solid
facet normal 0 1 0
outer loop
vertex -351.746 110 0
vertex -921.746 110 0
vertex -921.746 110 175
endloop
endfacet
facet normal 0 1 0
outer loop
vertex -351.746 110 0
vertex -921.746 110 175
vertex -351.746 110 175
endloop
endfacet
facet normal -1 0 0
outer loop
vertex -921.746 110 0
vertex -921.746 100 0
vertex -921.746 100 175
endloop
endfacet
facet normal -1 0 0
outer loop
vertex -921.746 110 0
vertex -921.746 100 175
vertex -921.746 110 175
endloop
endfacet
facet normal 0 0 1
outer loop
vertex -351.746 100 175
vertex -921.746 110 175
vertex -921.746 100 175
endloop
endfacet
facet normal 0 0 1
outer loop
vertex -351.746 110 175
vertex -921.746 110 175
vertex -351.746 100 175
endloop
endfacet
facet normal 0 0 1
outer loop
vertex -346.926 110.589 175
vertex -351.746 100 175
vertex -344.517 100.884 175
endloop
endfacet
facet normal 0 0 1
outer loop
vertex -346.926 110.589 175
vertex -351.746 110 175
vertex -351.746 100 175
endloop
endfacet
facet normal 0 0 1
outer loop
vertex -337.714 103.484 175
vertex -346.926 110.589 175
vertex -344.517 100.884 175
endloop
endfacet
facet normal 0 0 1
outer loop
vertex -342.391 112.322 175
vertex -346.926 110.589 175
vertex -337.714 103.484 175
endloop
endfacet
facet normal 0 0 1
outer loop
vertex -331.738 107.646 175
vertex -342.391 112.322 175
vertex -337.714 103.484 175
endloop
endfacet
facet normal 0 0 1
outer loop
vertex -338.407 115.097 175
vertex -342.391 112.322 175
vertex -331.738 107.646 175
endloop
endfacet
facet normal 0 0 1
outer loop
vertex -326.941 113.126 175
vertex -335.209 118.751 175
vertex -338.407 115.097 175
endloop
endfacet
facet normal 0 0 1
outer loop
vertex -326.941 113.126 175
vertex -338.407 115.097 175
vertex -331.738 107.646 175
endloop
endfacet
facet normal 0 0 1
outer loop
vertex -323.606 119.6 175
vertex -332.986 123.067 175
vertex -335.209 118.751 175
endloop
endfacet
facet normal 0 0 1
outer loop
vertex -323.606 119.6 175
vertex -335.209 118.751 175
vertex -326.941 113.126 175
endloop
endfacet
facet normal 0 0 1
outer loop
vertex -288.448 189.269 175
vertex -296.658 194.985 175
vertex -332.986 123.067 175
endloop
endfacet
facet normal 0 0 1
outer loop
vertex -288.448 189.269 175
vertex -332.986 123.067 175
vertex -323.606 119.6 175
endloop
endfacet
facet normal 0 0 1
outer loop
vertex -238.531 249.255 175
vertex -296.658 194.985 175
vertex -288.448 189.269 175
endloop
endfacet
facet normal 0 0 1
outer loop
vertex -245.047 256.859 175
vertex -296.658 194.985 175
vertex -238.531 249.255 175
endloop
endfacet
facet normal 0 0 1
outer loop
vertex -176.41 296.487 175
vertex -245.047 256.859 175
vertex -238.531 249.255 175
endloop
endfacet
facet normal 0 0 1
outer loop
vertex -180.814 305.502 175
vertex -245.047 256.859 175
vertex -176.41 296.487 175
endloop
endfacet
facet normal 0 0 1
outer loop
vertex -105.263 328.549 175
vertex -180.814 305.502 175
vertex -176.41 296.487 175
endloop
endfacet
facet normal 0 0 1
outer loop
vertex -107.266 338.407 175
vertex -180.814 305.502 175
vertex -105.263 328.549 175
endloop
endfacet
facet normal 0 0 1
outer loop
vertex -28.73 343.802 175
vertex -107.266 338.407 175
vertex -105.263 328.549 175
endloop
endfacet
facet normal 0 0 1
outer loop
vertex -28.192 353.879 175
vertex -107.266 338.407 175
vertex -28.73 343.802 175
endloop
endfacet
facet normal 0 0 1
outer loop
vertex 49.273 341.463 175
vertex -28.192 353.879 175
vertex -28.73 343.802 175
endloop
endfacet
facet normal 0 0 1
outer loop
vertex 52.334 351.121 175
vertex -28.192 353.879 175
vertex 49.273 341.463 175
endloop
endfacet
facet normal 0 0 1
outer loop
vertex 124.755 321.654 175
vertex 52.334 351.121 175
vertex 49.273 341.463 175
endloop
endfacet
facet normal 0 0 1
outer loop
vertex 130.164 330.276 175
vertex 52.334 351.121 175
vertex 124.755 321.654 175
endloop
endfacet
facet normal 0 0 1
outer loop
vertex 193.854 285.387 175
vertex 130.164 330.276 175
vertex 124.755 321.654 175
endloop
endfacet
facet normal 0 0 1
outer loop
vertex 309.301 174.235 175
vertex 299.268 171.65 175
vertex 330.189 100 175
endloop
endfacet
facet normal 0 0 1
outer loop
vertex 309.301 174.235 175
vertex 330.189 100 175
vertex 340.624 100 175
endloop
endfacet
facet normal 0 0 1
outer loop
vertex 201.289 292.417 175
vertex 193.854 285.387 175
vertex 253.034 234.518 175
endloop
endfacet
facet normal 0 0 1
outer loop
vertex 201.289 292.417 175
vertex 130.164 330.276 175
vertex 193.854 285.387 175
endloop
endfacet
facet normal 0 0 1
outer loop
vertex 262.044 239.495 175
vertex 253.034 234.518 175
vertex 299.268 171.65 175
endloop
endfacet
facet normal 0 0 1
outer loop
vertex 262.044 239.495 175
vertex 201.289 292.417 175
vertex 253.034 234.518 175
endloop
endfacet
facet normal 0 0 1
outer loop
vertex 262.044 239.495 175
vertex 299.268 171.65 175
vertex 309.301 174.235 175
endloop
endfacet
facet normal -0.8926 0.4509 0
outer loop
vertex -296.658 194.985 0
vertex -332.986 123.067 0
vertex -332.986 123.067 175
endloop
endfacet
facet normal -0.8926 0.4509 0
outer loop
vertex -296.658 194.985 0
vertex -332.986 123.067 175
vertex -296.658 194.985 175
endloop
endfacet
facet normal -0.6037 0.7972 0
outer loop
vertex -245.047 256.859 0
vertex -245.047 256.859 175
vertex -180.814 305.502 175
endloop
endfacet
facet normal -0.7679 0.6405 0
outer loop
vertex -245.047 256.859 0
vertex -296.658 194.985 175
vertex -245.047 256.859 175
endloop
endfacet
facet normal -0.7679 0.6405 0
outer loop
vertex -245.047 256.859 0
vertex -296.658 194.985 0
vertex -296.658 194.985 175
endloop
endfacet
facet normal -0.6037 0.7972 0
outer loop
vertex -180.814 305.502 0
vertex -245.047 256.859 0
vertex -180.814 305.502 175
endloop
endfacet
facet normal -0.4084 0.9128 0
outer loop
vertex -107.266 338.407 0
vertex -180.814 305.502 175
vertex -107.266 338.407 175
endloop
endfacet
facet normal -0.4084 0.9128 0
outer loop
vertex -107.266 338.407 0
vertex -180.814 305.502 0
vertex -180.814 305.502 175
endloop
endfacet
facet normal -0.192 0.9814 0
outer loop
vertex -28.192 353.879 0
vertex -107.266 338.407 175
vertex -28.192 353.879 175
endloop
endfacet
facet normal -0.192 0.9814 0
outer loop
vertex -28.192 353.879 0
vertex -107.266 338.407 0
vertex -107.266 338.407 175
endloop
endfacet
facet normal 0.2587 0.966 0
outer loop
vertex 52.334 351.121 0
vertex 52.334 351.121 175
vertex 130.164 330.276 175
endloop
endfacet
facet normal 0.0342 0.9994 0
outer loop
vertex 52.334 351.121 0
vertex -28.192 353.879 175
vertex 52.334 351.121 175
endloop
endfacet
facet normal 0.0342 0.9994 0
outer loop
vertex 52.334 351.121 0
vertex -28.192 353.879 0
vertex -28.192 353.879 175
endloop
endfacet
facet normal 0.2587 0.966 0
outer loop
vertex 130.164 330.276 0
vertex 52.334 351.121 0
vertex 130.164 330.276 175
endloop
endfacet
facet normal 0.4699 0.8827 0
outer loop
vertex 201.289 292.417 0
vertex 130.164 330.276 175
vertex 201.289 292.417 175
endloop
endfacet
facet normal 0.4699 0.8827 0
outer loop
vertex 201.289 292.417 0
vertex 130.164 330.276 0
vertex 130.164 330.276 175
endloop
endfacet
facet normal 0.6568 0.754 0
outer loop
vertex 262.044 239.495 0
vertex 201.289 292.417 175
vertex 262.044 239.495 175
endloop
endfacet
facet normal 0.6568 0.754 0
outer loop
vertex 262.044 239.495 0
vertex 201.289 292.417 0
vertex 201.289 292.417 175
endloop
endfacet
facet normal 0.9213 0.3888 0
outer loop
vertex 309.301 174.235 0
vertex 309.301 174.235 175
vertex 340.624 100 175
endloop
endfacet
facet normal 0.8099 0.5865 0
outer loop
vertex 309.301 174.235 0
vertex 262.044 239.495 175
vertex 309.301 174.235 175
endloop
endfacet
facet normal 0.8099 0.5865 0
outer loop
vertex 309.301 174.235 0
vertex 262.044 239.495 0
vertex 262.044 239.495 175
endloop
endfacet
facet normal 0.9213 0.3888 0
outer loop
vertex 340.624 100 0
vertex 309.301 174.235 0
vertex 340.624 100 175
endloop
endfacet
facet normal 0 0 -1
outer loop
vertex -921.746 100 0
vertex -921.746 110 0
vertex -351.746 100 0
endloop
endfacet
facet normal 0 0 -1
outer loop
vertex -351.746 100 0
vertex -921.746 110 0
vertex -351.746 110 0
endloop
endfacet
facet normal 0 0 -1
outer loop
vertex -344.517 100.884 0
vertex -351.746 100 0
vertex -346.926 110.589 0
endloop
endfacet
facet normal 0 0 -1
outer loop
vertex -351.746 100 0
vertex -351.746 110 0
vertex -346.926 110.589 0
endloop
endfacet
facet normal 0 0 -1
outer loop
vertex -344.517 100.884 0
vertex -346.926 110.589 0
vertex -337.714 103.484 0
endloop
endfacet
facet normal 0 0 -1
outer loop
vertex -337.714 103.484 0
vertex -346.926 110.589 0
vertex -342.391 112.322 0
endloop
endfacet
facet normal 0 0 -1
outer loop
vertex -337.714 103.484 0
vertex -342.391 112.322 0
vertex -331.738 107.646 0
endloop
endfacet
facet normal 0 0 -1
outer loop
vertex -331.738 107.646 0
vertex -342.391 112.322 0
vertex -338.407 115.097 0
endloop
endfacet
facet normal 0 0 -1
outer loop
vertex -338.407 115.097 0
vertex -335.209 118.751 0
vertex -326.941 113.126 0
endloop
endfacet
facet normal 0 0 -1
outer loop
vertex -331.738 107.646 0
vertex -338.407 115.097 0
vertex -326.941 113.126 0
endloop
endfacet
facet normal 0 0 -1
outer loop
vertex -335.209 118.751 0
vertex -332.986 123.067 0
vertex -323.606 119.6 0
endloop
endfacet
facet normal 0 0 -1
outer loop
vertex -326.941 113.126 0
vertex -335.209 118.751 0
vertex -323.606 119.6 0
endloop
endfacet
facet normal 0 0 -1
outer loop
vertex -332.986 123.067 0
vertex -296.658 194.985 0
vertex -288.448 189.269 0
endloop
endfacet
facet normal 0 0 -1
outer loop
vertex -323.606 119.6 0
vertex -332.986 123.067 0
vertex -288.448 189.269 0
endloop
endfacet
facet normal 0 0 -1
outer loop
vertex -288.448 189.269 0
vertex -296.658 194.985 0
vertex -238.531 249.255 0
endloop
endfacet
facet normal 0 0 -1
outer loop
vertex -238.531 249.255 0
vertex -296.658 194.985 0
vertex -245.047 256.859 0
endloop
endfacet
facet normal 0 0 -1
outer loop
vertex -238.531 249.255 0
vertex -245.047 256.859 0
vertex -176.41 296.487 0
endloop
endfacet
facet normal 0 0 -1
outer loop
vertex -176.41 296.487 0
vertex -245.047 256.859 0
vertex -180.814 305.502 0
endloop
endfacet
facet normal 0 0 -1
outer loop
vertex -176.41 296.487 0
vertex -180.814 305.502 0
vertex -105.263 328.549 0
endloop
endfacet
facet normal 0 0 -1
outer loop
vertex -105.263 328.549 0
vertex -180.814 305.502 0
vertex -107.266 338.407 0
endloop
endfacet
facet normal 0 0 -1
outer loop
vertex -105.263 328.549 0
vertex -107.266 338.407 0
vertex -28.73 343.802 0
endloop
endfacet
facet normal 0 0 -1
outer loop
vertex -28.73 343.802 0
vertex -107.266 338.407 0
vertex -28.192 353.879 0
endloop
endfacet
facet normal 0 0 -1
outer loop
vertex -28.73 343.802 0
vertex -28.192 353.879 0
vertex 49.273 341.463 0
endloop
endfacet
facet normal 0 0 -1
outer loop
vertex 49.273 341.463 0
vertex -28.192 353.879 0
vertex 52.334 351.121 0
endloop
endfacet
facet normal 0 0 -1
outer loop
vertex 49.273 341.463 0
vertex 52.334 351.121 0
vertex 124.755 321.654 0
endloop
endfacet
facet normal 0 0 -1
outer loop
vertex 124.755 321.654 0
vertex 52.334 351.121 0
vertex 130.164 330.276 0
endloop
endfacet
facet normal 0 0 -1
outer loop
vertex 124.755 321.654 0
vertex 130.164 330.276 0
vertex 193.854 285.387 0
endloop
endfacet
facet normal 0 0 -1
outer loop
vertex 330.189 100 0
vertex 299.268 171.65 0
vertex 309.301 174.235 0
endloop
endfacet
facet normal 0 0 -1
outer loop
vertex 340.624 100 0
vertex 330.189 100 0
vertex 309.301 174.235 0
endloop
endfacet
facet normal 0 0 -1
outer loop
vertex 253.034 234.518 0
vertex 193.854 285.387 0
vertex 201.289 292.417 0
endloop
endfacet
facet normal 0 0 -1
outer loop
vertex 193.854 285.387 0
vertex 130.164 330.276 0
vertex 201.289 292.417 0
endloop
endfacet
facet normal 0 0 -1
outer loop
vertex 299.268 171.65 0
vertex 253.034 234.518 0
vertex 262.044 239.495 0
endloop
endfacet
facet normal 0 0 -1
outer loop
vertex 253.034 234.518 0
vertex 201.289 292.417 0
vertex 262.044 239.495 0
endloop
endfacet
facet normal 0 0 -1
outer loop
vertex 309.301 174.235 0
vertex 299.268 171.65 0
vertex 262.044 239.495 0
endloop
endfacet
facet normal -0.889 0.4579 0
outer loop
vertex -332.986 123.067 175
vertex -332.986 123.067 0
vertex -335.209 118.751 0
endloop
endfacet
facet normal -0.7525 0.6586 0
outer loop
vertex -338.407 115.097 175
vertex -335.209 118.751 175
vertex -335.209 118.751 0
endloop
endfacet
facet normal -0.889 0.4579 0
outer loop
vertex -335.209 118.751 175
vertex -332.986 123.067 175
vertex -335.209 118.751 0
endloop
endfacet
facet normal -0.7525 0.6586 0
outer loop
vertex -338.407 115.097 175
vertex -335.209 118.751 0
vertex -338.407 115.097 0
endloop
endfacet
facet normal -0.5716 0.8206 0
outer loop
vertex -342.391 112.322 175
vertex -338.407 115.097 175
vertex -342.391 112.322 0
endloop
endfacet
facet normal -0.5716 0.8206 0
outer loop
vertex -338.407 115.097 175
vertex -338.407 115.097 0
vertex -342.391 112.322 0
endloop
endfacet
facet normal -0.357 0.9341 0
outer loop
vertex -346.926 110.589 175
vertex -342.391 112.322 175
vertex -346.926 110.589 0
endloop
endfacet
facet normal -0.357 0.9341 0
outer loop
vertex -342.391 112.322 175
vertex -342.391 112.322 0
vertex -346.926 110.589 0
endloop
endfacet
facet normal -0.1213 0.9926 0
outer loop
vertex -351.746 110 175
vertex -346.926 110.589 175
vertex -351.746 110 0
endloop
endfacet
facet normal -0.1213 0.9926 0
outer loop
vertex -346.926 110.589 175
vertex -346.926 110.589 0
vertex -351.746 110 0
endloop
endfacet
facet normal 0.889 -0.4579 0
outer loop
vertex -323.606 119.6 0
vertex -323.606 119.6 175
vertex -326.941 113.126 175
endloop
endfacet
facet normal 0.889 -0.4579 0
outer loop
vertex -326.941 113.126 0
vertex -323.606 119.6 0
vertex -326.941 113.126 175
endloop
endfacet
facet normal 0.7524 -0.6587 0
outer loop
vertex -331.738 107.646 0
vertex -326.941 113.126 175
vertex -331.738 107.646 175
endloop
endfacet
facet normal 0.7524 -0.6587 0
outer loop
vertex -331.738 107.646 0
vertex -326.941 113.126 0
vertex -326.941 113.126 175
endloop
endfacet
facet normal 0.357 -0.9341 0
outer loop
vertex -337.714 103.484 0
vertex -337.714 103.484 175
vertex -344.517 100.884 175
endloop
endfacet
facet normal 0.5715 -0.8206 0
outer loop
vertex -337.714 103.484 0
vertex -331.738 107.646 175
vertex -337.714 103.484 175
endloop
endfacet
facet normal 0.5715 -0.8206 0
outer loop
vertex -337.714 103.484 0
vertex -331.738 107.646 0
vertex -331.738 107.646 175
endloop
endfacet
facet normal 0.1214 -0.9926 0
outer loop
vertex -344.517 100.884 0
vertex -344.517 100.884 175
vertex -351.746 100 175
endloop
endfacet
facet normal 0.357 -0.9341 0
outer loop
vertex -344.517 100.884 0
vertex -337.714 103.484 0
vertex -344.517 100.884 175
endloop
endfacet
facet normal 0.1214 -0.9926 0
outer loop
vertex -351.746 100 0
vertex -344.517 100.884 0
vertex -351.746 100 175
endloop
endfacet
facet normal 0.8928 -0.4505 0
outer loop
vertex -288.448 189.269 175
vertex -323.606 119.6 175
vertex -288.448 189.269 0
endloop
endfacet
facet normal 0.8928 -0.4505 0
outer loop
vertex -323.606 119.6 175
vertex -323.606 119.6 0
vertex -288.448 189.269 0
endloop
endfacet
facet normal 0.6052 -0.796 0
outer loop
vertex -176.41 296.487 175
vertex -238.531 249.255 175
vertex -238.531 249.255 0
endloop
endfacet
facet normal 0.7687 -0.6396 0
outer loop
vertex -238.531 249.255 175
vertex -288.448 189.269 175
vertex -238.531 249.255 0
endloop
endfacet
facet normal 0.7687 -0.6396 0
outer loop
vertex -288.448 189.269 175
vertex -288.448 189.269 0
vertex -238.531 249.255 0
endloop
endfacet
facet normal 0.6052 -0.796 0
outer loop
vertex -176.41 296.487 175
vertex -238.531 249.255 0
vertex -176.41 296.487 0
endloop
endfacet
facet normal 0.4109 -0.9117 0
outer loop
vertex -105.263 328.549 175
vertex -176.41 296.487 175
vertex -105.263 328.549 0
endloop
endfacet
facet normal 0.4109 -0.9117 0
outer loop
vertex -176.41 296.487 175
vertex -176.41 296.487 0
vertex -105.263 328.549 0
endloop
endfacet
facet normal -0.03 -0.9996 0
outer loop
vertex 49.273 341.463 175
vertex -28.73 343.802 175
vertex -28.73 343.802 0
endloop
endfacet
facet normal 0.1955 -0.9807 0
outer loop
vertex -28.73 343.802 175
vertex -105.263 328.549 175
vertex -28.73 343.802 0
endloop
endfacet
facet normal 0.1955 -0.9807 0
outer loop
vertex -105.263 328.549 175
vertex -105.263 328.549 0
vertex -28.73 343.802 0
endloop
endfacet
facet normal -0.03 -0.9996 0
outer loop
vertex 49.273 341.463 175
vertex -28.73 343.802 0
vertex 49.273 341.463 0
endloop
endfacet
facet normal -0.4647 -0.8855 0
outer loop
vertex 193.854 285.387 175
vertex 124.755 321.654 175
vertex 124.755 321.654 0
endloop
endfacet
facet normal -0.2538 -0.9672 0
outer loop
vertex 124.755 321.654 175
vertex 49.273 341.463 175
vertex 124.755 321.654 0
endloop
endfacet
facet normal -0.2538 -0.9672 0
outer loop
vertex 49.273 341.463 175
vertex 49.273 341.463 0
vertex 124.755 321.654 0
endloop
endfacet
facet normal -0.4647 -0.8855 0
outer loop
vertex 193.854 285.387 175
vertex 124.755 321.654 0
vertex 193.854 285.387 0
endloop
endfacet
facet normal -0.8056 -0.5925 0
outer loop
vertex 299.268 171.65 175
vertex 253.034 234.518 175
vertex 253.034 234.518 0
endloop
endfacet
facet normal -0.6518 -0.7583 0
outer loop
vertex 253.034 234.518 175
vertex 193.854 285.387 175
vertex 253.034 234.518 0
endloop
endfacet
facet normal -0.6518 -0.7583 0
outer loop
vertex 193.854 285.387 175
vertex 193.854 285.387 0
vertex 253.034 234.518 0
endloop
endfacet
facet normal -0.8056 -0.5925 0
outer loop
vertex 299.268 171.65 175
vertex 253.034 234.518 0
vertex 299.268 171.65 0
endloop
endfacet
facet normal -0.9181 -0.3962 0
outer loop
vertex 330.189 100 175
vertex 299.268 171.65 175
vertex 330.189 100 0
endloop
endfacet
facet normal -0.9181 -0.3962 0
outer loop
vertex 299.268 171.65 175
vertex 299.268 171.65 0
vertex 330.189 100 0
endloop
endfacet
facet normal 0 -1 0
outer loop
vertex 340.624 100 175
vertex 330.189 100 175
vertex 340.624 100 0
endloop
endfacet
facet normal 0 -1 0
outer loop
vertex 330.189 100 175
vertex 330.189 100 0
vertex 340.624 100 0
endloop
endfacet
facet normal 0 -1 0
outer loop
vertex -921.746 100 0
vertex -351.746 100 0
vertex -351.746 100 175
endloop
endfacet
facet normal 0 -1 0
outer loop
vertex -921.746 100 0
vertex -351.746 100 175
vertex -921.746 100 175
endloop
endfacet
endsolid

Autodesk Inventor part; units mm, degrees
ref_plane "YZ Plane" through (0, 0, 0) normal (1, 0, 0) x (0, 1, 0)
ref_plane "XZ Plane" through (0, 0, 0) normal (0, 1, 0) x (-1, 0, 0)
ref_plane "XY Plane" through (0, 0, 0) normal (0, 0, 1) x (1, 0, 0)
sketch "Sketch1" plane through (0, 0, 0) normal (0, 0, 1) x (1, 0, 0)
  arc A0 (330.1893, 100) -> (-323.606, 119.6) centre (0, 0) ccw
  line L0 (-351.7456, 100) -> (-921.7456, 100)
  arc A1 (-351.7456, 100) -> (-323.606, 119.6) centre (-351.7456, 130) ccw
  arc A2 (340.6244, 100) -> (-332.9859, 123.0667) centre (0, 0) ccw
  line L1 (-921.7456, 100) -> (-921.7456, 110)
  line L2 (-921.7456, 110) -> (-351.7456, 110)
  arc A3 (-351.7456, 110) -> (-332.9859, 123.0667) centre (-351.7456, 130) ccw
  line L3 (0, 0) -> (0, 130)
  line L4 (330.1893, 100) -> (340.6244, 100)
  point P0 (330.3407, 130)
  dimension "d25" = 130
  dimension "d26" = 20
  dimension "d27" = 30
  dimension "d28" = 570
  dimension "d29" = 345
  dimension "d30" = 100
extrude "Extrusion1" add sketch "Sketch1" along normal blind 175
properties part number "carril1"
